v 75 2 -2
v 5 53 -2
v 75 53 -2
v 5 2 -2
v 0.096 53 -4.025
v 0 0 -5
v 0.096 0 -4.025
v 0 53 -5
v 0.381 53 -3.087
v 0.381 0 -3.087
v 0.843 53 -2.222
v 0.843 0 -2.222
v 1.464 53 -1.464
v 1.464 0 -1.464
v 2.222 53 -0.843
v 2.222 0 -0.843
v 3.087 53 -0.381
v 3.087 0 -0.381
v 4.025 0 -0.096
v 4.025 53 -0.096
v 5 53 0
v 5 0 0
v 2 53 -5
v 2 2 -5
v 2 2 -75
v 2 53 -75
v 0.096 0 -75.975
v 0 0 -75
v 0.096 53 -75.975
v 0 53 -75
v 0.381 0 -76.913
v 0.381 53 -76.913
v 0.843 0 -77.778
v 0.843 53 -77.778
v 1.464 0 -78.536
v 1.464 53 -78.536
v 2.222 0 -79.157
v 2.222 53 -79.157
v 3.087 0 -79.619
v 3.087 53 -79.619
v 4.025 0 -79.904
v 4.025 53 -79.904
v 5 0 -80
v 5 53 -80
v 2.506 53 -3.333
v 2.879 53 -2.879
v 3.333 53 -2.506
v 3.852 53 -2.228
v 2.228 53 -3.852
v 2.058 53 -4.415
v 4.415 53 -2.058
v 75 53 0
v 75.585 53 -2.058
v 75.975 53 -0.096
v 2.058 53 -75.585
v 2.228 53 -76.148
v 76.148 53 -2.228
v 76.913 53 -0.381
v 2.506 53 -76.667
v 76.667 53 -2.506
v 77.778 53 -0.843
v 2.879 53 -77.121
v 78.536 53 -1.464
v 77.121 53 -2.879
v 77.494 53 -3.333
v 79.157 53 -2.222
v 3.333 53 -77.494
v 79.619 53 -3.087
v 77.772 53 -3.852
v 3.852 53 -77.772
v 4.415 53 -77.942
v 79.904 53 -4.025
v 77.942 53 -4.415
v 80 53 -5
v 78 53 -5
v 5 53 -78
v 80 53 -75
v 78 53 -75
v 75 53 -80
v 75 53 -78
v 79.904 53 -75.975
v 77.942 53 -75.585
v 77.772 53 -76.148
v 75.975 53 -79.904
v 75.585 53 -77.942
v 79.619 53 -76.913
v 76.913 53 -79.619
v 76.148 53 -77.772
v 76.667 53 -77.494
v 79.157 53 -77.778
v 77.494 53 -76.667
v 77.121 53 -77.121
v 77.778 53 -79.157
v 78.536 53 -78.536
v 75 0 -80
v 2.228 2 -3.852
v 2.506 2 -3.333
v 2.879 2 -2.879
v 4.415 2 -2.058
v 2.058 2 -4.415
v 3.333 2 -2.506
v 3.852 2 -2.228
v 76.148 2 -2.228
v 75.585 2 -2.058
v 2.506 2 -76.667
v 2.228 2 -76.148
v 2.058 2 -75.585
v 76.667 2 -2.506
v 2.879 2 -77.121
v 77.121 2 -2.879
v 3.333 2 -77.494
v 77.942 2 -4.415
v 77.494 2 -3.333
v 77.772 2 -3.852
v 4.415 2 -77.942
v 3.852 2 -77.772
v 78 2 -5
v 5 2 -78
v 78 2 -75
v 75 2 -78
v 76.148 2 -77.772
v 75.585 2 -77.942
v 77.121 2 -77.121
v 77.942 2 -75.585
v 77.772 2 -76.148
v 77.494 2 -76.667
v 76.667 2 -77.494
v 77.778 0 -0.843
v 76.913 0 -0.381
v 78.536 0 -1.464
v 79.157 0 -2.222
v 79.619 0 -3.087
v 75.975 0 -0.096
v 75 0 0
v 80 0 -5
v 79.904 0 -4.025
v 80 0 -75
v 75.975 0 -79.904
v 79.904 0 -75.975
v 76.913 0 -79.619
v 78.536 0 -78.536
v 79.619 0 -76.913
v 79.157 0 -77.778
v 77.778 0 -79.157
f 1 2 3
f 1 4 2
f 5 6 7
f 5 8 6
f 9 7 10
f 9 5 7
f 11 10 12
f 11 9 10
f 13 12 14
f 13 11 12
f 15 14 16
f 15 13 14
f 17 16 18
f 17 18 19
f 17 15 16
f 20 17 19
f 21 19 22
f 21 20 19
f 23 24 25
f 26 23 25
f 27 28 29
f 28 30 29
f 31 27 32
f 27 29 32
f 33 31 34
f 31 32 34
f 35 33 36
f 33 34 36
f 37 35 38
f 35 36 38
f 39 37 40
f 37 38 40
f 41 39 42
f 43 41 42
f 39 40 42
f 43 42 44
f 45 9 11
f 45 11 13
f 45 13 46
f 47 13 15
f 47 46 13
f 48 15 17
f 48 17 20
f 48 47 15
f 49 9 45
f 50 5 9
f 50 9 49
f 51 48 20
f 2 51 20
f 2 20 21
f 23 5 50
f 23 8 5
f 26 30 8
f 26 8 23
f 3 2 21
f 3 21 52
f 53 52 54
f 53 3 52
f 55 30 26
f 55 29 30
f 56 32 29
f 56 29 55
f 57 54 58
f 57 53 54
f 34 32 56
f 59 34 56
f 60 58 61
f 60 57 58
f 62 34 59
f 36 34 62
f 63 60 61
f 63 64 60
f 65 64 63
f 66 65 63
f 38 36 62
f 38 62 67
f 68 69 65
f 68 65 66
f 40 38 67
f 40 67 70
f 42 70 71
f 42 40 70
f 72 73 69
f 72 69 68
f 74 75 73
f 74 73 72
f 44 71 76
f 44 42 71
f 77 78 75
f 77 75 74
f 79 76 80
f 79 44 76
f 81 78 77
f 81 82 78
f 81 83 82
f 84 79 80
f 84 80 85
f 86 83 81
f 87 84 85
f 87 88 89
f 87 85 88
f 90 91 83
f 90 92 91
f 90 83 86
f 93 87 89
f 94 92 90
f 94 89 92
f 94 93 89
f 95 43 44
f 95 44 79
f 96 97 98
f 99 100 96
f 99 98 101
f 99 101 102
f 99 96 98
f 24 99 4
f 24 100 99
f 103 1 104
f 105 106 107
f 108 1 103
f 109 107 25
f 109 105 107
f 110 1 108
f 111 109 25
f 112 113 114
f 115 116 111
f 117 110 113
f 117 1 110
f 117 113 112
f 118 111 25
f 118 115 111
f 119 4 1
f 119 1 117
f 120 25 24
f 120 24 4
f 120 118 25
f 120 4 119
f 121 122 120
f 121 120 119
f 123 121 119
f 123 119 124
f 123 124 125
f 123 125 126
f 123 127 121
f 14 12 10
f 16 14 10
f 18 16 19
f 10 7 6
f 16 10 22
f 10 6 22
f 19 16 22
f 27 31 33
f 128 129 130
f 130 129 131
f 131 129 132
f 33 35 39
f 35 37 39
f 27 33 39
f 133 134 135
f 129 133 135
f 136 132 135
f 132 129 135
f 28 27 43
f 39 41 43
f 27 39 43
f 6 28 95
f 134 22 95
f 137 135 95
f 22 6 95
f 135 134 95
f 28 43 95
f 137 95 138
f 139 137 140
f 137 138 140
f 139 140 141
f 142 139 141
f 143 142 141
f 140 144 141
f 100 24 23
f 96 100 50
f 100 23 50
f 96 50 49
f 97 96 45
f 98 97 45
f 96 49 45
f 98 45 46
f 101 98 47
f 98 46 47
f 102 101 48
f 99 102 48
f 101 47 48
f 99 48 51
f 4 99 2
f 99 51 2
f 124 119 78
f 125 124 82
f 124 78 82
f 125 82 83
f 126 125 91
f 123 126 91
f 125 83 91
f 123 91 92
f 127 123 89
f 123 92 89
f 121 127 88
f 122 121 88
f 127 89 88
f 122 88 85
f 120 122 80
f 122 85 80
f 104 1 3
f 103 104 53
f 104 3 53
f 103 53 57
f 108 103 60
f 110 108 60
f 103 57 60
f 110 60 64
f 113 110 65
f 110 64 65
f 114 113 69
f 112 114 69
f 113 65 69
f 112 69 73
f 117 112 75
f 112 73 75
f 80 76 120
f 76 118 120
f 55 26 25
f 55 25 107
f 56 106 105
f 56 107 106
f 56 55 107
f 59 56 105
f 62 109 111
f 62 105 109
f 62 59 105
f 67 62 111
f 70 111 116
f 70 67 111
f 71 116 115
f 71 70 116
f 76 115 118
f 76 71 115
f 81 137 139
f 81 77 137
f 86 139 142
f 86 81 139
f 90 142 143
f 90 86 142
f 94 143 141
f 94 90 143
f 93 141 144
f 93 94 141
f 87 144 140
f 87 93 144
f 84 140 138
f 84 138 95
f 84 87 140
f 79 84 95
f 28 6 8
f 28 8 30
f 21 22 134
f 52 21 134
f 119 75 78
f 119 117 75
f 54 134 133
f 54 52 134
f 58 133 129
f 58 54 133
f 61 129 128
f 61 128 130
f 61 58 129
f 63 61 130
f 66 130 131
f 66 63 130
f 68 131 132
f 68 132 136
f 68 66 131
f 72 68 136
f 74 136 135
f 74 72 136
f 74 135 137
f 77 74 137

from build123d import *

# Parameters (mm, degrees)
ESQUISSE1_W      = 80
ESQUISSE1_H      = 80
EXTRUSION1_DEPTH = 53
CONG_1_R         = 5
COQUE1_T         = -2


with BuildPart() as part:
    # Esquisse1 → Extrusion1 (new body)
    with BuildSketch(Plane(origin=(0, 0, 0), x_dir=(1, 0, 0), z_dir=(0, 1, 0))):
        with Locations((40, 40)):
            Rectangle(ESQUISSE1_W, ESQUISSE1_H)
    extrude(amount=EXTRUSION1_DEPTH)

    # Congé1
    cong_1_edges = [part.edges().sort_by_distance(p)[0] for p in [
        (0, 26.5, -80),
        (80, 26.5, -80),
        (80, 26.5, 0),
        (0, 26.5, 0),
    ]]
    fillet(cong_1_edges, radius=CONG_1_R)

    # Coque1
    coque1_openings = [part.faces().sort_by_distance(p)[0] for p in [
        (40, 53, -40),
    ]]
    offset(amount=COQUE1_T, openings=coque1_openings, kind=Kind.INTERSECTION)


solid = part.part
